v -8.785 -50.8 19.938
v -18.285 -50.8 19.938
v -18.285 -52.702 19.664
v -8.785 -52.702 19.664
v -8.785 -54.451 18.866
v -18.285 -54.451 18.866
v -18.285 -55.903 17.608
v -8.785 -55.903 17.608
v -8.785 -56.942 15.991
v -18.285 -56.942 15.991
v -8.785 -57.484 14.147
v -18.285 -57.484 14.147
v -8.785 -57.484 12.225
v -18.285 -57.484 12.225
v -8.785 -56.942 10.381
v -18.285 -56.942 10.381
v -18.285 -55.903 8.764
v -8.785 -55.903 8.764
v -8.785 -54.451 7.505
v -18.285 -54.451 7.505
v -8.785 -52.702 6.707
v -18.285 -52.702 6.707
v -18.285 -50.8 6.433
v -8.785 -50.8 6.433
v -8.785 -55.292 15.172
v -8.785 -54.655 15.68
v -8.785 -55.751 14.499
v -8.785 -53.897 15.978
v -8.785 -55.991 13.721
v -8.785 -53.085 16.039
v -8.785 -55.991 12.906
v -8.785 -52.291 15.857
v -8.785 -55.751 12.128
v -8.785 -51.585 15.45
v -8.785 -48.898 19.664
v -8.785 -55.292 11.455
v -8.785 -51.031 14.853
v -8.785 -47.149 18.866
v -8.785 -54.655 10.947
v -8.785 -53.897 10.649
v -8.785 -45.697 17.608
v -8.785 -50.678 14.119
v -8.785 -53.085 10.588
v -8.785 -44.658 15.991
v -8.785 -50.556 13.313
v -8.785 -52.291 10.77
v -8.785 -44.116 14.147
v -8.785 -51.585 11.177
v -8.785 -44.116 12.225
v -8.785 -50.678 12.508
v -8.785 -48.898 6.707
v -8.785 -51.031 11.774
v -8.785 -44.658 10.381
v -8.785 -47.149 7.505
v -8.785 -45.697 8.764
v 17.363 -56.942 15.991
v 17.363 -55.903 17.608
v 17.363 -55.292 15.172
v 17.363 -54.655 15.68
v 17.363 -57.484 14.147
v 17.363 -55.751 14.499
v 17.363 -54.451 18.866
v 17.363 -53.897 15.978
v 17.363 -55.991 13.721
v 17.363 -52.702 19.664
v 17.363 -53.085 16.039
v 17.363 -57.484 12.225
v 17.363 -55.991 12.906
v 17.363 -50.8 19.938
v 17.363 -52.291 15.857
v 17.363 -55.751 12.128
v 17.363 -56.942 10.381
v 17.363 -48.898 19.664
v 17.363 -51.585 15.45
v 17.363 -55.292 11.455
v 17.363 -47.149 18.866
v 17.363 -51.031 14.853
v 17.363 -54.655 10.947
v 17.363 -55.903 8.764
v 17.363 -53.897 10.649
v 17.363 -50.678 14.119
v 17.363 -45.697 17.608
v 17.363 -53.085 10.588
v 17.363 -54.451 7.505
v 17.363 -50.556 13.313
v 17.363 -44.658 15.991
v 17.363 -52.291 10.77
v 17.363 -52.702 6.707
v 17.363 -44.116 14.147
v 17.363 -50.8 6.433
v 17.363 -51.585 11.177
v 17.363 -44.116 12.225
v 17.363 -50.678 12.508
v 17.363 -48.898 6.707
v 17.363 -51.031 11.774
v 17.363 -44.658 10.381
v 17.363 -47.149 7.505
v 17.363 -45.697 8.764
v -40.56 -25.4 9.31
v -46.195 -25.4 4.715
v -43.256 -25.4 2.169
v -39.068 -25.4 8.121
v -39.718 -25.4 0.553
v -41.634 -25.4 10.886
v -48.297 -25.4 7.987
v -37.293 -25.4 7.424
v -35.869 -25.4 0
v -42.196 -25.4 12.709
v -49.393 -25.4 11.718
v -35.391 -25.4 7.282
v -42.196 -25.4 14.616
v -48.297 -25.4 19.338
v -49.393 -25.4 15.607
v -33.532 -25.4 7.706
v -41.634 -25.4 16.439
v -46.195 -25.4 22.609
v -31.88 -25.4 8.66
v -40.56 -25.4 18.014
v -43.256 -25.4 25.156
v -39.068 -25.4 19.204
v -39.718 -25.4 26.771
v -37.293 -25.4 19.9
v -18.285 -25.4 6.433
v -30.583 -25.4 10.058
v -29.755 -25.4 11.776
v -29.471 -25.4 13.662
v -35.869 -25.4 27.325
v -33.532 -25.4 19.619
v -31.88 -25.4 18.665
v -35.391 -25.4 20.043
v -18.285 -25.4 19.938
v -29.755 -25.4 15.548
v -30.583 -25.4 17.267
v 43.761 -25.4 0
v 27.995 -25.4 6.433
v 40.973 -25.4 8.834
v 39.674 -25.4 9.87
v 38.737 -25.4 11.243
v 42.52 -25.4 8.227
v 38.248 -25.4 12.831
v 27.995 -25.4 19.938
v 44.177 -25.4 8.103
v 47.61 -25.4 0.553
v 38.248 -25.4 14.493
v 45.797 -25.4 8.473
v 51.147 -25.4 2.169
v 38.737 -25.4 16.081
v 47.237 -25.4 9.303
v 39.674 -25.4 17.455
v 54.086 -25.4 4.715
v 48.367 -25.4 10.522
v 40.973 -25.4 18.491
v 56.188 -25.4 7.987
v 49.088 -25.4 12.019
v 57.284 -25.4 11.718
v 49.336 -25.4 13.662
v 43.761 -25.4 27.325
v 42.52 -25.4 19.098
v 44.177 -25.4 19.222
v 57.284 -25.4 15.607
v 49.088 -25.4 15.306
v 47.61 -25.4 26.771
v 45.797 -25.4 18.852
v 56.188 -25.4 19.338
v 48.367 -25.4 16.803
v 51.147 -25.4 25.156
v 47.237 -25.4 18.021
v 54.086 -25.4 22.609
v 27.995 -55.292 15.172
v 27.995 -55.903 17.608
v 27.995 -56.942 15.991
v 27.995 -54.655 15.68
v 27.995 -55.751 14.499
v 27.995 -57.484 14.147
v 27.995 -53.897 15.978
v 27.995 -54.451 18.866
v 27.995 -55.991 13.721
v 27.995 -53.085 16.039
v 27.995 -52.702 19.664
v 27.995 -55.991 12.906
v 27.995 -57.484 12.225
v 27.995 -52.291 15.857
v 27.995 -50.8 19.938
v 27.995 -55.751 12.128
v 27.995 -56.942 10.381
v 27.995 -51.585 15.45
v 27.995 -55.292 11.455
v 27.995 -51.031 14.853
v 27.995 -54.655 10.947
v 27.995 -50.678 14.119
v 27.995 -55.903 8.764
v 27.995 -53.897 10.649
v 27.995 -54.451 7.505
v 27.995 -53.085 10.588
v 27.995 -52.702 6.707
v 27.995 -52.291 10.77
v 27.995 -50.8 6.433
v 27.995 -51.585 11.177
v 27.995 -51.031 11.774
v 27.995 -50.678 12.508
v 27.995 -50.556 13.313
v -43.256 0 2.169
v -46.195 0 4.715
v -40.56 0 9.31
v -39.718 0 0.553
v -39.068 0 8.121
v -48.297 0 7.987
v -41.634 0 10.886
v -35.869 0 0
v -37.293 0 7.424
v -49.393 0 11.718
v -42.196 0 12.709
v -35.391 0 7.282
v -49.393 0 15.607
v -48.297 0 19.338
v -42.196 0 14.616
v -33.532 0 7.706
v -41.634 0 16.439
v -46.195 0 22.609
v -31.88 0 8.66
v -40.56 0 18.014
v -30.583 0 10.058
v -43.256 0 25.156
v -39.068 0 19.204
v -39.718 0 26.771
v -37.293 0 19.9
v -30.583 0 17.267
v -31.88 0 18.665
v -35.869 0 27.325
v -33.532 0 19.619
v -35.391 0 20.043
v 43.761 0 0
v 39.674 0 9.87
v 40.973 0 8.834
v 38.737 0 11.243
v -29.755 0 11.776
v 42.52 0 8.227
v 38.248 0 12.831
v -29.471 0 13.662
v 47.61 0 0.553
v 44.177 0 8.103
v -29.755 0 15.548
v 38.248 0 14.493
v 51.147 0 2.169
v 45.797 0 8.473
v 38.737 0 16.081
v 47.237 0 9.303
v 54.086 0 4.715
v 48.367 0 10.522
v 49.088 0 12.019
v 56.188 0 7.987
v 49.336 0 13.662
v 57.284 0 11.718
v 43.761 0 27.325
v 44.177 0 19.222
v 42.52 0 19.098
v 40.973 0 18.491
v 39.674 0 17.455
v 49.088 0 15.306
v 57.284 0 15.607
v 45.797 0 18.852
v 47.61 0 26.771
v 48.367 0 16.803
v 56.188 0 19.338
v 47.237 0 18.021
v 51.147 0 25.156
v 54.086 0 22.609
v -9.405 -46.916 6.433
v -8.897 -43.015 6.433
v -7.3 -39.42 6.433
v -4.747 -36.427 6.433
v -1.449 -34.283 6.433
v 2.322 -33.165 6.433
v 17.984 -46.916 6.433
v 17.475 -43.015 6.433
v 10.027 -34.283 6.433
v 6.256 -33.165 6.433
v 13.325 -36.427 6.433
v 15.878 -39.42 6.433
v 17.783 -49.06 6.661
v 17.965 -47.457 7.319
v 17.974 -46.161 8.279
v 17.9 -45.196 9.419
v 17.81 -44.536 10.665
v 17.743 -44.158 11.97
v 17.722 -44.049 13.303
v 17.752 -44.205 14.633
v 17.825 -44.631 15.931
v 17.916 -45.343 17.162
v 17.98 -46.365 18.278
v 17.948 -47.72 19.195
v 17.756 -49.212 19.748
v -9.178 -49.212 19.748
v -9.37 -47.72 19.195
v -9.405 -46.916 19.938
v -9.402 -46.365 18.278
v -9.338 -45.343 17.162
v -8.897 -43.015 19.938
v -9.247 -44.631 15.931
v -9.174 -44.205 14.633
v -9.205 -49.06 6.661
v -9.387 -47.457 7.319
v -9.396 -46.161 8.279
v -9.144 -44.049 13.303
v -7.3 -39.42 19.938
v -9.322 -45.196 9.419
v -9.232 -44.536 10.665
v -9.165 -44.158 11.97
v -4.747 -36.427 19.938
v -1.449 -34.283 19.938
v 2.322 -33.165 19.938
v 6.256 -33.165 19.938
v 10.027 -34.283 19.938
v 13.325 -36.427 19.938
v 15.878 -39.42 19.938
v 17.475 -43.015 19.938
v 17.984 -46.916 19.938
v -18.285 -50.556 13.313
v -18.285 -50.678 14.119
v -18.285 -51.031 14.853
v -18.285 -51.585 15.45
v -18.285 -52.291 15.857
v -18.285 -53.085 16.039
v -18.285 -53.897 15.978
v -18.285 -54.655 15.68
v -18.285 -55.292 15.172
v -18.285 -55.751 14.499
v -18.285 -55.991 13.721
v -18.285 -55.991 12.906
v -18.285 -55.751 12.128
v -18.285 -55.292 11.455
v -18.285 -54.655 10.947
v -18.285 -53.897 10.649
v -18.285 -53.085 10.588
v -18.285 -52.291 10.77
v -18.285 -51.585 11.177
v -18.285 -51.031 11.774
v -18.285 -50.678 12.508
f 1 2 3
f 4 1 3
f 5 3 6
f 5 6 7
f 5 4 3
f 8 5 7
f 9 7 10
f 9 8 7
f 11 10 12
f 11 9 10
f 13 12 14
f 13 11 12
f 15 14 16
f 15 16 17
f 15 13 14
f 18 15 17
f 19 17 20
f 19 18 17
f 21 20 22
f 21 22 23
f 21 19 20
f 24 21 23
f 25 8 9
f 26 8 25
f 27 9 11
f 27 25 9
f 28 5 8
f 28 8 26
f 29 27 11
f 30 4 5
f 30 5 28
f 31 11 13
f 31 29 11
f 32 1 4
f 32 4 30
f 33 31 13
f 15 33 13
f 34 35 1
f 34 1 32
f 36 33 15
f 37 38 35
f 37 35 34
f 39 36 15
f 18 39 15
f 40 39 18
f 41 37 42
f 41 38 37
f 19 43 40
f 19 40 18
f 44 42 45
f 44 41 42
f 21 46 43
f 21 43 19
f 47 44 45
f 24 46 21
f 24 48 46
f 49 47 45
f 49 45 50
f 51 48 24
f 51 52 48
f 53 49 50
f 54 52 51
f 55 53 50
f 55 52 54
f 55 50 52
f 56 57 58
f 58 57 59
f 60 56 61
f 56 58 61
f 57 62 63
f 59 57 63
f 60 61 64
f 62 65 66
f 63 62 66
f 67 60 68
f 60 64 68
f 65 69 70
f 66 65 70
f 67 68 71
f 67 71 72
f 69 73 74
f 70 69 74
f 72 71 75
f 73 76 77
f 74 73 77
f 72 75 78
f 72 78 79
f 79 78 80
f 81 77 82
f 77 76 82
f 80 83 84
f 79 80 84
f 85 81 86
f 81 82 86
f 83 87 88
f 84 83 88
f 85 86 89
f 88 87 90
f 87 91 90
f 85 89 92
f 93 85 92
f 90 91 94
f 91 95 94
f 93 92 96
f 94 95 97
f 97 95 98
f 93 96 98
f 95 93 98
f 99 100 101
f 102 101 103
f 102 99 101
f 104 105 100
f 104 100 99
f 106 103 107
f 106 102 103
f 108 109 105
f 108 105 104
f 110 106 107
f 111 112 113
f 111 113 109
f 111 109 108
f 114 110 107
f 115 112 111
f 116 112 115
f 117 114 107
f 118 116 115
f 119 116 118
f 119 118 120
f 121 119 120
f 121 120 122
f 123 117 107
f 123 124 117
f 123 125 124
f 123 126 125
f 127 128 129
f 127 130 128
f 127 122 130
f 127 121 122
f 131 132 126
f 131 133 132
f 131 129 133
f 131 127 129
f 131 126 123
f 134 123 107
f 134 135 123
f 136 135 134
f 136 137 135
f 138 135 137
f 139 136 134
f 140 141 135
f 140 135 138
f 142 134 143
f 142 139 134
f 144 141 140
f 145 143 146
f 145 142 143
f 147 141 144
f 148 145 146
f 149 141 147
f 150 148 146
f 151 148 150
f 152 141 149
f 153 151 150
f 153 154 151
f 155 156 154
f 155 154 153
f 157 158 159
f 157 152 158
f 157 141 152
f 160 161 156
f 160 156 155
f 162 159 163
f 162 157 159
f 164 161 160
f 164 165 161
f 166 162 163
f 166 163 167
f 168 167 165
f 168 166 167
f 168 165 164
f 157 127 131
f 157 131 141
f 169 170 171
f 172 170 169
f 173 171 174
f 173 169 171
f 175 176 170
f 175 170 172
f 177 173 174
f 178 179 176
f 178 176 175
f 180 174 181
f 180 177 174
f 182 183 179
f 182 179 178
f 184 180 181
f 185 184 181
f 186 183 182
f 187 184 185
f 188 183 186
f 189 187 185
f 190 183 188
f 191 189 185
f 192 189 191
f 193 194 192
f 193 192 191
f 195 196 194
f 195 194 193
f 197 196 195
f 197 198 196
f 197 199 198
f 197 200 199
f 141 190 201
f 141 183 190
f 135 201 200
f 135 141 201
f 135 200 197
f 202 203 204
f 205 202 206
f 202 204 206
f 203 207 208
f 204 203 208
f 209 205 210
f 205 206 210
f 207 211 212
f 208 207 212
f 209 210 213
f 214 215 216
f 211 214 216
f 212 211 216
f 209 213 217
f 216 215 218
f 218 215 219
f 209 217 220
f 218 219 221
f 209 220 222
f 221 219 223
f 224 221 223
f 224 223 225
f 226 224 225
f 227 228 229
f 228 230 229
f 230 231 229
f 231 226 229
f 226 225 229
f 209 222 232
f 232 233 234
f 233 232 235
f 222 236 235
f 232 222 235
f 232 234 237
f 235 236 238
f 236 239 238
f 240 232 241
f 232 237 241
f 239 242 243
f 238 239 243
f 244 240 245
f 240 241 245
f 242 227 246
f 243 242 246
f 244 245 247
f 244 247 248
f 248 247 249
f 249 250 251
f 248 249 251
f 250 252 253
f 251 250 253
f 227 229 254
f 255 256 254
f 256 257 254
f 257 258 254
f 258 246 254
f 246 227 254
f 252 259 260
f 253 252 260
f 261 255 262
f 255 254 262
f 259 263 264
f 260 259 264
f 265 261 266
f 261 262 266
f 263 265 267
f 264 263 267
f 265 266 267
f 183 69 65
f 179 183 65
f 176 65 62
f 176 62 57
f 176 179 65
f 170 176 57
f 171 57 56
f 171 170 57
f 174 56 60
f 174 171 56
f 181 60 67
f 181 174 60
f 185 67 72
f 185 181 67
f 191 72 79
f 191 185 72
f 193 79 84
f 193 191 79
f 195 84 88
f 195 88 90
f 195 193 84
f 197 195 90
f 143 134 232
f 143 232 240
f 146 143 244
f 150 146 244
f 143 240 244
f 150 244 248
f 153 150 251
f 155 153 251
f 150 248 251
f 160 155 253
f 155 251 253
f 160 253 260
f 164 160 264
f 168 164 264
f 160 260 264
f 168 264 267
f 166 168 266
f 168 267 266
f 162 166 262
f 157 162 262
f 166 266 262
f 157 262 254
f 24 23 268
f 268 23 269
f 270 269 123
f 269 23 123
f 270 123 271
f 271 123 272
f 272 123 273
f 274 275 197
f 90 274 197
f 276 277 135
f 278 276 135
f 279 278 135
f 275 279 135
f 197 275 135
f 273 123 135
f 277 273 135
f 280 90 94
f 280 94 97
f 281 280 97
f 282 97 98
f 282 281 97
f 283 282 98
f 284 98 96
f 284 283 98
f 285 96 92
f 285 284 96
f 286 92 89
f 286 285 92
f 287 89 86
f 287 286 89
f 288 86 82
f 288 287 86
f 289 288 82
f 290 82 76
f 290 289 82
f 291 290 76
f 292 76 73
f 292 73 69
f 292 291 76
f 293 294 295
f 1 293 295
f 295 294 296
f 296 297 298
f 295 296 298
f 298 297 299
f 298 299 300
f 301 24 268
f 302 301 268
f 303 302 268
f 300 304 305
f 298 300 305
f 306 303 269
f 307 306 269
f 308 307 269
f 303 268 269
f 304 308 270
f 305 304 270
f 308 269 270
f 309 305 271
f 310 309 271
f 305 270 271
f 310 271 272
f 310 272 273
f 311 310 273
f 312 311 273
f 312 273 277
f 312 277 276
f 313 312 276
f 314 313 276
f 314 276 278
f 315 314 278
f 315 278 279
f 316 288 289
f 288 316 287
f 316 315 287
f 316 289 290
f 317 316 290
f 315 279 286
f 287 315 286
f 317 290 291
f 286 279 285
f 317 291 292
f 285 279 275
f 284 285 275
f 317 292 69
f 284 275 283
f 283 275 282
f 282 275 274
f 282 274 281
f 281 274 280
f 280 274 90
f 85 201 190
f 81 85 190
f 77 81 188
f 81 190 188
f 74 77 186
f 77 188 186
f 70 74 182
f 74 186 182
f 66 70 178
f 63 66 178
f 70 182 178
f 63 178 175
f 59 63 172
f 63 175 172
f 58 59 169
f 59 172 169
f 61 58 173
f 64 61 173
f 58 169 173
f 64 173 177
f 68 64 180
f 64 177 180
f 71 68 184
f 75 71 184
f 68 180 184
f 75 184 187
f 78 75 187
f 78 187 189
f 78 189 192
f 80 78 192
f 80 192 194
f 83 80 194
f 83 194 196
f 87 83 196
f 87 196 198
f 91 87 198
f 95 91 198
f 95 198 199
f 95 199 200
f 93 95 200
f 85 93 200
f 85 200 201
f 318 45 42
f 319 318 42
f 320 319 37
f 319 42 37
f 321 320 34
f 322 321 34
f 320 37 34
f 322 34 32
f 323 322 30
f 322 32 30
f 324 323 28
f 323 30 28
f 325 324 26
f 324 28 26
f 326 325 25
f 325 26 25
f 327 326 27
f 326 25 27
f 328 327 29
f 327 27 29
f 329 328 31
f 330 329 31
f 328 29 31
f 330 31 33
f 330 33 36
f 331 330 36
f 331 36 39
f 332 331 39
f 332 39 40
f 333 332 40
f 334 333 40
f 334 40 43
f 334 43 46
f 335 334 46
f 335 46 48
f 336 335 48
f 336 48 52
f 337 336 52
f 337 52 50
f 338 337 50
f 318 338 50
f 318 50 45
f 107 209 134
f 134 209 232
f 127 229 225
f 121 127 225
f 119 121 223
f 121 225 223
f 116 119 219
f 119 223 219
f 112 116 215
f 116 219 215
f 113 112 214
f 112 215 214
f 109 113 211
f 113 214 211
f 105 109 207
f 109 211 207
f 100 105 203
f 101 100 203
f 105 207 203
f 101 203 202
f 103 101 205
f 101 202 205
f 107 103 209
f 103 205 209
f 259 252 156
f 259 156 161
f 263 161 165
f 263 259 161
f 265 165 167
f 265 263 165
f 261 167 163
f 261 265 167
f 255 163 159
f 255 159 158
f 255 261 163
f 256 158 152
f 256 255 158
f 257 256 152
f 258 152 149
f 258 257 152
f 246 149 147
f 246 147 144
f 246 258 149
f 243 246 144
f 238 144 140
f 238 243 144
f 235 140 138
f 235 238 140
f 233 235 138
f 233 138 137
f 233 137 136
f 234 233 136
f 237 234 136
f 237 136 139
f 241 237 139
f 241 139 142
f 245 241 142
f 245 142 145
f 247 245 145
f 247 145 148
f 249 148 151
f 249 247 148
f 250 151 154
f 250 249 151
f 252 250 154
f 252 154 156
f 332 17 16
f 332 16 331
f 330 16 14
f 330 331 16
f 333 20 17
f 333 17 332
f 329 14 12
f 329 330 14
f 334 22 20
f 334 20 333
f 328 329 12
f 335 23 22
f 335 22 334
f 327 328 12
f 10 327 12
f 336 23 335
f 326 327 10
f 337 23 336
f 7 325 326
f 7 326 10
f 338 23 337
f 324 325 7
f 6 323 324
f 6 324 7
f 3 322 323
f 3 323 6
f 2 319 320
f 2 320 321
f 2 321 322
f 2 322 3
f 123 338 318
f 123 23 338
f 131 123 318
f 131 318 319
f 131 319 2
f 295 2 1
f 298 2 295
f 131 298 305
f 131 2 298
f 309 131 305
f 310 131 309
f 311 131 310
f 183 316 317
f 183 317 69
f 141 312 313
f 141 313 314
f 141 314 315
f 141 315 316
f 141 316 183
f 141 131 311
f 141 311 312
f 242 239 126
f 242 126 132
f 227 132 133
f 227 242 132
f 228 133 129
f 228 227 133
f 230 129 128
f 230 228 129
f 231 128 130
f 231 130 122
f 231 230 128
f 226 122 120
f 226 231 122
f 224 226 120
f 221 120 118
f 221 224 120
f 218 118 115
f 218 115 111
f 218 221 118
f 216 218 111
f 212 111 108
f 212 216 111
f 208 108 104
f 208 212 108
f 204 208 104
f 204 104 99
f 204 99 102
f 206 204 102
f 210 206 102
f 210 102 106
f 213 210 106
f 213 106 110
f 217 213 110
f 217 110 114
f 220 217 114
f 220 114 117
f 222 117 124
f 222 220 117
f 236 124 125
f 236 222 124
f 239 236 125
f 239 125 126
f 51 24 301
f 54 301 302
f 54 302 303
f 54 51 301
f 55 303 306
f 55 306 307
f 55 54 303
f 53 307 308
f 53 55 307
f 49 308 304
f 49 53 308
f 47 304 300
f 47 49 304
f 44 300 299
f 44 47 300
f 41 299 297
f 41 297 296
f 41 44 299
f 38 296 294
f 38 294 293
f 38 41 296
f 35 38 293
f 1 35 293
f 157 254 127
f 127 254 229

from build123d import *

# Parameters (mm, degrees)
F0_R      = 6.3984297888
F0_R_2    = 5.5753
F1_DEPTH  = 25.4
F2_W      = 46.2799873203
F2_H      = 13.5046518408
F3_DEPTH  = 25.4
F5_DEPTH  = 69.342
F6_W      = 9.5002483577
F6_H      = 6.7523259204
F7_W      = 10.6321182102
F7_H      = 6.7523259204
F10_R     = 2.7327204499
F11_DEPTH = 182.626


with BuildPart() as f1:
    # F0 (on Front) → F1 (new body)
    with BuildSketch(Plane.XZ):
        with BuildLine():
            Line((43.7605383081, 27.3248670252), (-35.8691346556, 27.3248670252))
            ThreePointArc((-35.8691346556, 27.3248670252), (-49.5315681682, 13.6624335126), (-35.8691346556, 0))
            Line((-35.8691346556, 0), (43.7605383081, 0))
            ThreePointArc((43.7605383081, 0), (57.4229718207, 13.6624335126), (43.7605383081, 27.3248670252))
        make_face()
        with Locations((-35.8691346556, 13.6624335126)):
            Circle(F0_R, mode=Mode.SUBTRACT)
        with Locations((43.7605383081, 13.6624335126)):
            Circle(F0_R_2, mode=Mode.SUBTRACT)
    extrude(amount=F1_DEPTH)

    # F2 (on face) → F3 (join)
    with BuildSketch(Plane.XZ.offset(25.4)):
        with Locations((4.8549743369, 13.1856810767)):
            Rectangle(F2_W, F2_H)
    extrude(amount=F3_DEPTH)

    # F4 (on face) → F5 (cut)
    with BuildSketch(Plane(origin=(0, 0, 6.4333551563), x_dir=(1, 0, 0), z_dir=(0, 0, -1))):
        with BuildLine():
            Line((17.3628497869, 50.8), (-8.7847709656, 50.8))
            ThreePointArc((-8.7847709656, 50.8), (4.2890394107, 33.0230943258), (17.3628497869, 50.8))
        make_face()
    extrude(amount=-F5_DEPTH, mode=Mode.SUBTRACT)

    # F6 (on face) → F8 (revolve)
    with BuildSketch(Plane.XZ.offset(50.8)):
        with Locations((-13.5348951444, 9.8095181165)):
            Rectangle(F6_W, F6_H)
    revolve(axis=Axis((-13.5348951444, -50.8, 13.1856810767), (1, 0, 0)))

    # F7 (on face) → F9 (revolve)
    with BuildSketch(Plane.XZ.offset(50.8)):
        with Locations((22.678908892, 9.8095181165)):
            Rectangle(F7_W, F7_H)
    revolve(axis=Axis((22.678908892, -50.8, 13.1856810767), (1, 0, 0)))

    # F10 (on face) → F11 (cut)
    with BuildSketch(Plane.YZ.offset(27.9949679971)):
        with Locations((-53.2889179885, 13.3134396747)):
            Circle(F10_R)
    extrude(amount=-F11_DEPTH, mode=Mode.SUBTRACT)


solid = f1.part
